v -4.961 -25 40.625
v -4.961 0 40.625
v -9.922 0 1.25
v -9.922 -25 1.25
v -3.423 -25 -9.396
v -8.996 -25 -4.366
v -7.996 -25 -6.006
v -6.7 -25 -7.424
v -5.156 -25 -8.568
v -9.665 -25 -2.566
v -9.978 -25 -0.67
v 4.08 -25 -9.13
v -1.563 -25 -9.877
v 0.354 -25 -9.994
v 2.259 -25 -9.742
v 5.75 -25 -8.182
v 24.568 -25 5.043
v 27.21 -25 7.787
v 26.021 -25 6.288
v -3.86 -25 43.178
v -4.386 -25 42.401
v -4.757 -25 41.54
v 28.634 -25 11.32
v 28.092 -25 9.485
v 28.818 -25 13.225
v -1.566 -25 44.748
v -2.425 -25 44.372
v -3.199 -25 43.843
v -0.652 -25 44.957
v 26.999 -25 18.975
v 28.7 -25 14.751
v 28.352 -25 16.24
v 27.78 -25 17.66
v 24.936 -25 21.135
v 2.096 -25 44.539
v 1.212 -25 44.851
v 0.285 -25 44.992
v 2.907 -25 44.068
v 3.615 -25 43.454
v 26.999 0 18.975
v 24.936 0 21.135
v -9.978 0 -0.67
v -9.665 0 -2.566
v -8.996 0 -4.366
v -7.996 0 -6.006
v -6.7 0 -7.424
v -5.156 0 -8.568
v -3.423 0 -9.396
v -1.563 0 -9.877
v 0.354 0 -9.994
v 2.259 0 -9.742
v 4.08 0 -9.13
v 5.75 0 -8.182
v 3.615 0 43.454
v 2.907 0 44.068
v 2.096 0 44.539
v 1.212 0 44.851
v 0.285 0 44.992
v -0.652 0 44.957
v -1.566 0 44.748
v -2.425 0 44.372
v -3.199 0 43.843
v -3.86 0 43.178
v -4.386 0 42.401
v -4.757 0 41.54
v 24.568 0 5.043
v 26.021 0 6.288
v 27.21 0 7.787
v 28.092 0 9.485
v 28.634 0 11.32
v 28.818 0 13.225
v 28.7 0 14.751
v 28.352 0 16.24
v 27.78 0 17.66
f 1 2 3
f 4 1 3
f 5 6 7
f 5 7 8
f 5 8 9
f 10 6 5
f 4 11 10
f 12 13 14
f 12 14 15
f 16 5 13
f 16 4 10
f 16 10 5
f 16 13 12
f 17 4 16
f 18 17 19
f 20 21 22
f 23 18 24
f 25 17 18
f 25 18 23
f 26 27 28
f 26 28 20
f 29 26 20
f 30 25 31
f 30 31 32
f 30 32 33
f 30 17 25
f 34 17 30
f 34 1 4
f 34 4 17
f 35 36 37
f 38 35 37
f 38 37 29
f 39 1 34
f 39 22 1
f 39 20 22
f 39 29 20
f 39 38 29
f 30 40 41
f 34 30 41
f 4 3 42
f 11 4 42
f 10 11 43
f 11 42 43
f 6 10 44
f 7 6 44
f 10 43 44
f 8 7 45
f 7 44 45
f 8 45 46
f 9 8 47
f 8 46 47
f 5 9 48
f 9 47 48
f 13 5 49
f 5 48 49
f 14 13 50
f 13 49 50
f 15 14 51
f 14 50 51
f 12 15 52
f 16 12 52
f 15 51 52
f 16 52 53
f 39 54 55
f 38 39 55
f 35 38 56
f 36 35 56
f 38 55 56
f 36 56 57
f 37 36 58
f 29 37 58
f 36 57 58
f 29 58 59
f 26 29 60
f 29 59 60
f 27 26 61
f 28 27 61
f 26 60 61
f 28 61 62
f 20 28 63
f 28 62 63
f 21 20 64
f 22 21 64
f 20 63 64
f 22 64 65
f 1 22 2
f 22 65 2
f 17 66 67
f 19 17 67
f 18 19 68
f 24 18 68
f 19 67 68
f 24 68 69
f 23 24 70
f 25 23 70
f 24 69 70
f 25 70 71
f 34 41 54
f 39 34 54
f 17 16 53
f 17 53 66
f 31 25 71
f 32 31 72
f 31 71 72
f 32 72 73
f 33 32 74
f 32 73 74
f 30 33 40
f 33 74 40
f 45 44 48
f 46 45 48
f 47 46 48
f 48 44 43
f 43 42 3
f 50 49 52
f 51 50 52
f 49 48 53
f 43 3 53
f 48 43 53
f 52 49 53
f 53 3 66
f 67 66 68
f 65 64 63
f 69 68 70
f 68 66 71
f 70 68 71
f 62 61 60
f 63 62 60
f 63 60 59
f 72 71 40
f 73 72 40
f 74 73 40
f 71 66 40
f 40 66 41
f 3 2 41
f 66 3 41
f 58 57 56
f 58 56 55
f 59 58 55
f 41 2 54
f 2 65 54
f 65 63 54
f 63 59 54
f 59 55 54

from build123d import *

# Parameters (mm, degrees)
F1_DEPTH = 25


# Not quite as in the source:
# - a feature names something its author has since deleted; it is built from what else it names


with BuildPart() as f1:
    # F0 (on Front) → F1 (new body)
    with BuildSketch(Plane.XZ):
        with BuildLine():
            ThreePointArc((5, 40), (4.4370598373, 37.6951138857), (2.875, 35.909232957))
            Line((2.875, 35.909232957), (13.0675283977, 21.406534086))
            ThreePointArc((13.0675283977, 21.406534086), (19.0462821804, 23.222383243), (24.9357240699, 21.1349735599))
            Line((24.9357240699, 21.1349735599), (3.6154854181, 43.4537320671))
            ThreePointArc((3.6154854181, 43.4537320671), (4.6409819592, 41.8604532928), (5, 40))
        make_face()
        with BuildLine():
            ThreePointArc((-9.9215674165, 1.25), (-6.6143782777, 7.5), (0, 10))
            Line((0, 10), (0, 35))
            ThreePointArc((0, 35), (-3.75, 36.6928108612), (-4.9607837082, 40.625))
            Line((-4.9607837082, 40.625), (-9.9215674165, 1.25))
        make_face()
        with BuildLine():
            Line((0, 35), (0, 10))
            ThreePointArc((0, 10), (4.6097722286, 8.8741196746), (8.181534086, 5.75))
            Line((8.181534086, 5.75), (10.6359943118, 7.475))
            ThreePointArc((10.6359943118, 7.475), (8.9664461732, 14.9443542409), (13.0675283977, 21.406534086))
            Line((13.0675283977, 21.406534086), (2.875, 35.909232957))
            ThreePointArc((2.875, 35.909232957), (1.5076744982, 35.2327242992), (0, 35))
        make_face()
        with BuildLine():
            Line((0, 40), (0, 35))
            ThreePointArc((0, 35), (1.5076744982, 35.2327242992), (2.875, 35.909232957))
            Line((2.875, 35.909232957), (0, 40))
        make_face()
        with BuildLine():
            Line((5.75, -8.181534086), (0, 0))
            Line((0, 0), (0, 10))
            ThreePointArc((0, 10), (-6.6143782777, 7.5), (-9.9215674165, 1.25))
            ThreePointArc((-9.9215674165, 1.25), (-5.1564476611, -8.5680247151), (5.75, -8.181534086))
        make_face()
        with BuildLine():
            Line((0, 10), (0, 0))
            Line((0, 0), (8.181534086, 5.75))
            ThreePointArc((8.181534086, 5.75), (4.6097722286, 8.8741196746), (0, 10))
        make_face()
        with BuildLine():
            Line((18.8175283977, 13.225), (24.5675283977, 5.043465914))
            ThreePointArc((24.5675283977, 5.043465914), (27.6916480724, 8.6152277714), (28.8175283977, 13.225))
            ThreePointArc((28.8175283977, 13.225), (28.3520797994, 16.2403489964), (26.9990624837, 18.975))
            Line((26.9990624837, 18.975), (18.8175283977, 13.225))
        make_face()
        with BuildLine():
            ThreePointArc((13.0675283977, 21.406534086), (8.9664461732, 14.9443542409), (10.6359943118, 7.475))
            Line((10.6359943118, 7.475), (18.8175283977, 13.225))
            Line((18.8175283977, 13.225), (13.0675283977, 21.406534086))
        make_face()
        with BuildLine():
            Line((13.0675283977, 21.406534086), (18.8175283977, 13.225))
            Line((18.8175283977, 13.225), (26.9990624837, 18.975))
            Line((26.9990624837, 18.975), (24.9357240699, 21.1349735599))
            ThreePointArc((24.9357240699, 21.1349735599), (19.0462821804, 23.222383243), (13.0675283977, 21.406534086))
        make_face()
        with BuildLine():
            Line((10.6359943118, 7.475), (8.181534086, 5.75))
            ThreePointArc((8.181534086, 5.75), (9.5345514016, 3.0153489964), (10, 0))
            ThreePointArc((10, 0), (8.8741196746, -4.6097722286), (5.75, -8.181534086))
            Line((5.75, -8.181534086), (24.5675283977, 5.043465914))
            ThreePointArc((24.5675283977, 5.043465914), (17.0981741569, 3.3739177755), (10.6359943118, 7.475))
        make_face()
        with BuildLine():
            Line((8.181534086, 5.75), (0, 0))
            Line((0, 0), (5.75, -8.181534086))
            ThreePointArc((5.75, -8.181534086), (8.8741196746, -4.6097722286), (10, 0))
            ThreePointArc((10, 0), (9.5345514016, 3.0153489964), (8.181534086, 5.75))
        make_face()
        with BuildLine():
            Line((18.8175283977, 13.225), (10.6359943118, 7.475))
            ThreePointArc((10.6359943118, 7.475), (17.0981741569, 3.3739177755), (24.5675283977, 5.043465914))
            Line((24.5675283977, 5.043465914), (18.8175283977, 13.225))
        make_face()
        with BuildLine():
            ThreePointArc((-4.9607837082, 40.625), (-3.75, 36.6928108612), (0, 35))
            Line((0, 35), (0, 40))
            Line((0, 40), (2.875, 35.909232957))
            ThreePointArc((2.875, 35.909232957), (4.4370598373, 37.6951138857), (5, 40))
            ThreePointArc((5, 40), (4.6409819592, 41.8604532928), (3.6154854181, 43.4537320671))
            ThreePointArc((3.6154854181, 43.4537320671), (-1.566169898, 44.7483799185), (-4.9607837082, 40.625))
        make_face()
    extrude(amount=F1_DEPTH)


solid = f1.part
